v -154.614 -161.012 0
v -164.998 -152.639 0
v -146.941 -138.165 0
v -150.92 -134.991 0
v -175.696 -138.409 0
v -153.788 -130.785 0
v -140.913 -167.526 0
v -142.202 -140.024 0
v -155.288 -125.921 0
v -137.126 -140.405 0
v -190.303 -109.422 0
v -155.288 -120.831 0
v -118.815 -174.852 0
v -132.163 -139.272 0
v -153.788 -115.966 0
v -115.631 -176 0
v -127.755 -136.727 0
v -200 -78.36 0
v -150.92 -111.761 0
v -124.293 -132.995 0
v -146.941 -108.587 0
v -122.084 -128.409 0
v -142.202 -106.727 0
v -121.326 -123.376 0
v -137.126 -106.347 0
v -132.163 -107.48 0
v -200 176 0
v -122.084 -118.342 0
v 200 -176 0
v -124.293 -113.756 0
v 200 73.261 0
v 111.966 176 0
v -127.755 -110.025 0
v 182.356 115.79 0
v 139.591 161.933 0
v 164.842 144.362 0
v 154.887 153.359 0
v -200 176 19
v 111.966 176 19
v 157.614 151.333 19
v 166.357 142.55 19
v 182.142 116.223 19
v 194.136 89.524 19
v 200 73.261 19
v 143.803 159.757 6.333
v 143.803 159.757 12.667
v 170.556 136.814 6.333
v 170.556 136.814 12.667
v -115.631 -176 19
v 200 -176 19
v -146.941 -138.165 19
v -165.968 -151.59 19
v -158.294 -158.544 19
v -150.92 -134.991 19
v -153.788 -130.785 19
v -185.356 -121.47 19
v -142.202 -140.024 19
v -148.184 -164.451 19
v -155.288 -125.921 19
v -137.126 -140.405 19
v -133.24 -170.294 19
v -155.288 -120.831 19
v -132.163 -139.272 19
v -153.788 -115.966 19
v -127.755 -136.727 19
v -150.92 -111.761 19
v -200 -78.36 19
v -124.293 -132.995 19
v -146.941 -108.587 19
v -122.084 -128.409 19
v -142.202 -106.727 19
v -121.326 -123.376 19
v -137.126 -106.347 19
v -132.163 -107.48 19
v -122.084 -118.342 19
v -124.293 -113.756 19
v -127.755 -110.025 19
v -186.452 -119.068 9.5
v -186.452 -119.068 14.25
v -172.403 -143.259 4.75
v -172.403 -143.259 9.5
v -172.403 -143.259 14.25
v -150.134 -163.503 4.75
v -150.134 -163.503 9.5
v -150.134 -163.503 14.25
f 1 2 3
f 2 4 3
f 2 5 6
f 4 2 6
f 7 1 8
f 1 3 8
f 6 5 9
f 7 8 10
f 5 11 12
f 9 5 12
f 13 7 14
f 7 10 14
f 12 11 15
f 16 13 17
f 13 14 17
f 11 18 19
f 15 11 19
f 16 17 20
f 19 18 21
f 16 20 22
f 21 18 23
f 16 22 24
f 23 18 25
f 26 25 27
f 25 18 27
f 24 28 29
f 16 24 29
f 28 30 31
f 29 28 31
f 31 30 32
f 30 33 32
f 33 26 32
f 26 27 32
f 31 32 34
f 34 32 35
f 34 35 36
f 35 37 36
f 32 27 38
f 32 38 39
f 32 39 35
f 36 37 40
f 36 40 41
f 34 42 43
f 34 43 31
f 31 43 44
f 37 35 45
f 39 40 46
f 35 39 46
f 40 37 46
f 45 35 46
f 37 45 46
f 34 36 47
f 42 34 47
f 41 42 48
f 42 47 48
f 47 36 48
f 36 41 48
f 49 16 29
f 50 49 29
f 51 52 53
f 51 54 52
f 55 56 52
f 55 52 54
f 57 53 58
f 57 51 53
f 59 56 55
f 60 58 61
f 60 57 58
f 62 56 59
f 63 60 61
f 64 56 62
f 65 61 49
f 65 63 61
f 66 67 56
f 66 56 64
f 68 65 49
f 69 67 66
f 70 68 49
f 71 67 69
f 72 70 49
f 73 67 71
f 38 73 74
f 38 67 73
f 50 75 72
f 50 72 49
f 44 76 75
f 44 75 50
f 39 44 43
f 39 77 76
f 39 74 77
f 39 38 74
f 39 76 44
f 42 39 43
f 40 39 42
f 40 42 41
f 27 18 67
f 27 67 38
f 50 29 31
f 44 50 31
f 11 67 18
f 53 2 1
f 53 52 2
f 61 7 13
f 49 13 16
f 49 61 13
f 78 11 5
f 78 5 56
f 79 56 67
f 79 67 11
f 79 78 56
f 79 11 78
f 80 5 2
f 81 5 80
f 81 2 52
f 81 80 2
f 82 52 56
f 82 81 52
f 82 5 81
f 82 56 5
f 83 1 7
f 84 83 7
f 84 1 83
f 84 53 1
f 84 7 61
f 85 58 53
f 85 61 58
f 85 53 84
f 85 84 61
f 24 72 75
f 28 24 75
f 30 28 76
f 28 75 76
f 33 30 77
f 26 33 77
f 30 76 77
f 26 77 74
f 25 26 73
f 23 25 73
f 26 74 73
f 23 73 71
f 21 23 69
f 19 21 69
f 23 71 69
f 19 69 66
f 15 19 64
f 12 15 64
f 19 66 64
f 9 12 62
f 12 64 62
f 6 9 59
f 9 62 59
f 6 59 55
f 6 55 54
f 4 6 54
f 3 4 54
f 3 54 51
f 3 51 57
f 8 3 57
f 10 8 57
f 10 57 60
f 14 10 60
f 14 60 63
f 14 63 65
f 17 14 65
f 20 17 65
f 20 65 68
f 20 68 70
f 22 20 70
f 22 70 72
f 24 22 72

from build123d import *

# Parameters (mm, degrees)
F0_W     = 400
F0_H     = 352
F1_DEPTH = 19
F3_DEPTH = 19.001
F4_R     = 17.0766139483
F5_DEPTH = 19.0010001


with BuildPart() as f1:
    # F0 (on Top) → F1 (new body)
    with BuildSketch(Plane.XY):
        Rectangle(F0_W, F0_H)
    extrude(amount=F1_DEPTH)

    # F2 (on face) → F3 (cut, through all)
    with BuildSketch(Plane.XY.offset(19)):
        with BuildLine():
            add(Edge.make_bspline(
                [(-200, -78.359618783), (-195.7803636721, -92.9464094347), (-188.2077942368, -119.1238987881), (-172.8338241624, -143.2121066887), (-156.2569923786, -165.3855569544), (-115.975253997, -175.3258984721), (-115.6307756901, -176)],
                knots=[0, 0, 0, 0, 0.2648009651, 0.4752124447, 0.7001594462, 0.9450581233, 0.9450581233, 0.9450581233, 0.9450581233], degree=3))
            Line((-200, -78.359618783), (-200, -176))
            Line((-200, -176), (-117.4777597189, -176))
            Line((-117.4777597189, -176), (-115.6307756901, -176))
        make_face()
        with BuildLine():
            Line((200, 176), (111.9655743241, 176))
            add(Edge.make_bspline(
                [(111.9655743241, 176), (123.0835042522, 170.3676733426), (145.2416377316, 159.1423960938), (172.7110494727, 144.455694766), (198.7014382707, 79.4978346928), (200, 73.2613801956)],
                knots=[0, 0, 0, 0, 0.2786310963, 0.5553142594, 0.9453657408, 0.9453657408, 0.9453657408, 0.9453657408], degree=3))
            Line((200, 73.2613801956), (200, 176))
        make_face()
    extrude(amount=-F3_DEPTH, mode=Mode.SUBTRACT)

    # F4 (on face) → F5 (cut, through all)
    with BuildSketch(Plane.XY.offset(19)):
        with Locations((-138.4022831917, -123.3757436275)):
            Circle(F4_R)
    extrude(amount=-F5_DEPTH, mode=Mode.SUBTRACT)


solid = f1.part
